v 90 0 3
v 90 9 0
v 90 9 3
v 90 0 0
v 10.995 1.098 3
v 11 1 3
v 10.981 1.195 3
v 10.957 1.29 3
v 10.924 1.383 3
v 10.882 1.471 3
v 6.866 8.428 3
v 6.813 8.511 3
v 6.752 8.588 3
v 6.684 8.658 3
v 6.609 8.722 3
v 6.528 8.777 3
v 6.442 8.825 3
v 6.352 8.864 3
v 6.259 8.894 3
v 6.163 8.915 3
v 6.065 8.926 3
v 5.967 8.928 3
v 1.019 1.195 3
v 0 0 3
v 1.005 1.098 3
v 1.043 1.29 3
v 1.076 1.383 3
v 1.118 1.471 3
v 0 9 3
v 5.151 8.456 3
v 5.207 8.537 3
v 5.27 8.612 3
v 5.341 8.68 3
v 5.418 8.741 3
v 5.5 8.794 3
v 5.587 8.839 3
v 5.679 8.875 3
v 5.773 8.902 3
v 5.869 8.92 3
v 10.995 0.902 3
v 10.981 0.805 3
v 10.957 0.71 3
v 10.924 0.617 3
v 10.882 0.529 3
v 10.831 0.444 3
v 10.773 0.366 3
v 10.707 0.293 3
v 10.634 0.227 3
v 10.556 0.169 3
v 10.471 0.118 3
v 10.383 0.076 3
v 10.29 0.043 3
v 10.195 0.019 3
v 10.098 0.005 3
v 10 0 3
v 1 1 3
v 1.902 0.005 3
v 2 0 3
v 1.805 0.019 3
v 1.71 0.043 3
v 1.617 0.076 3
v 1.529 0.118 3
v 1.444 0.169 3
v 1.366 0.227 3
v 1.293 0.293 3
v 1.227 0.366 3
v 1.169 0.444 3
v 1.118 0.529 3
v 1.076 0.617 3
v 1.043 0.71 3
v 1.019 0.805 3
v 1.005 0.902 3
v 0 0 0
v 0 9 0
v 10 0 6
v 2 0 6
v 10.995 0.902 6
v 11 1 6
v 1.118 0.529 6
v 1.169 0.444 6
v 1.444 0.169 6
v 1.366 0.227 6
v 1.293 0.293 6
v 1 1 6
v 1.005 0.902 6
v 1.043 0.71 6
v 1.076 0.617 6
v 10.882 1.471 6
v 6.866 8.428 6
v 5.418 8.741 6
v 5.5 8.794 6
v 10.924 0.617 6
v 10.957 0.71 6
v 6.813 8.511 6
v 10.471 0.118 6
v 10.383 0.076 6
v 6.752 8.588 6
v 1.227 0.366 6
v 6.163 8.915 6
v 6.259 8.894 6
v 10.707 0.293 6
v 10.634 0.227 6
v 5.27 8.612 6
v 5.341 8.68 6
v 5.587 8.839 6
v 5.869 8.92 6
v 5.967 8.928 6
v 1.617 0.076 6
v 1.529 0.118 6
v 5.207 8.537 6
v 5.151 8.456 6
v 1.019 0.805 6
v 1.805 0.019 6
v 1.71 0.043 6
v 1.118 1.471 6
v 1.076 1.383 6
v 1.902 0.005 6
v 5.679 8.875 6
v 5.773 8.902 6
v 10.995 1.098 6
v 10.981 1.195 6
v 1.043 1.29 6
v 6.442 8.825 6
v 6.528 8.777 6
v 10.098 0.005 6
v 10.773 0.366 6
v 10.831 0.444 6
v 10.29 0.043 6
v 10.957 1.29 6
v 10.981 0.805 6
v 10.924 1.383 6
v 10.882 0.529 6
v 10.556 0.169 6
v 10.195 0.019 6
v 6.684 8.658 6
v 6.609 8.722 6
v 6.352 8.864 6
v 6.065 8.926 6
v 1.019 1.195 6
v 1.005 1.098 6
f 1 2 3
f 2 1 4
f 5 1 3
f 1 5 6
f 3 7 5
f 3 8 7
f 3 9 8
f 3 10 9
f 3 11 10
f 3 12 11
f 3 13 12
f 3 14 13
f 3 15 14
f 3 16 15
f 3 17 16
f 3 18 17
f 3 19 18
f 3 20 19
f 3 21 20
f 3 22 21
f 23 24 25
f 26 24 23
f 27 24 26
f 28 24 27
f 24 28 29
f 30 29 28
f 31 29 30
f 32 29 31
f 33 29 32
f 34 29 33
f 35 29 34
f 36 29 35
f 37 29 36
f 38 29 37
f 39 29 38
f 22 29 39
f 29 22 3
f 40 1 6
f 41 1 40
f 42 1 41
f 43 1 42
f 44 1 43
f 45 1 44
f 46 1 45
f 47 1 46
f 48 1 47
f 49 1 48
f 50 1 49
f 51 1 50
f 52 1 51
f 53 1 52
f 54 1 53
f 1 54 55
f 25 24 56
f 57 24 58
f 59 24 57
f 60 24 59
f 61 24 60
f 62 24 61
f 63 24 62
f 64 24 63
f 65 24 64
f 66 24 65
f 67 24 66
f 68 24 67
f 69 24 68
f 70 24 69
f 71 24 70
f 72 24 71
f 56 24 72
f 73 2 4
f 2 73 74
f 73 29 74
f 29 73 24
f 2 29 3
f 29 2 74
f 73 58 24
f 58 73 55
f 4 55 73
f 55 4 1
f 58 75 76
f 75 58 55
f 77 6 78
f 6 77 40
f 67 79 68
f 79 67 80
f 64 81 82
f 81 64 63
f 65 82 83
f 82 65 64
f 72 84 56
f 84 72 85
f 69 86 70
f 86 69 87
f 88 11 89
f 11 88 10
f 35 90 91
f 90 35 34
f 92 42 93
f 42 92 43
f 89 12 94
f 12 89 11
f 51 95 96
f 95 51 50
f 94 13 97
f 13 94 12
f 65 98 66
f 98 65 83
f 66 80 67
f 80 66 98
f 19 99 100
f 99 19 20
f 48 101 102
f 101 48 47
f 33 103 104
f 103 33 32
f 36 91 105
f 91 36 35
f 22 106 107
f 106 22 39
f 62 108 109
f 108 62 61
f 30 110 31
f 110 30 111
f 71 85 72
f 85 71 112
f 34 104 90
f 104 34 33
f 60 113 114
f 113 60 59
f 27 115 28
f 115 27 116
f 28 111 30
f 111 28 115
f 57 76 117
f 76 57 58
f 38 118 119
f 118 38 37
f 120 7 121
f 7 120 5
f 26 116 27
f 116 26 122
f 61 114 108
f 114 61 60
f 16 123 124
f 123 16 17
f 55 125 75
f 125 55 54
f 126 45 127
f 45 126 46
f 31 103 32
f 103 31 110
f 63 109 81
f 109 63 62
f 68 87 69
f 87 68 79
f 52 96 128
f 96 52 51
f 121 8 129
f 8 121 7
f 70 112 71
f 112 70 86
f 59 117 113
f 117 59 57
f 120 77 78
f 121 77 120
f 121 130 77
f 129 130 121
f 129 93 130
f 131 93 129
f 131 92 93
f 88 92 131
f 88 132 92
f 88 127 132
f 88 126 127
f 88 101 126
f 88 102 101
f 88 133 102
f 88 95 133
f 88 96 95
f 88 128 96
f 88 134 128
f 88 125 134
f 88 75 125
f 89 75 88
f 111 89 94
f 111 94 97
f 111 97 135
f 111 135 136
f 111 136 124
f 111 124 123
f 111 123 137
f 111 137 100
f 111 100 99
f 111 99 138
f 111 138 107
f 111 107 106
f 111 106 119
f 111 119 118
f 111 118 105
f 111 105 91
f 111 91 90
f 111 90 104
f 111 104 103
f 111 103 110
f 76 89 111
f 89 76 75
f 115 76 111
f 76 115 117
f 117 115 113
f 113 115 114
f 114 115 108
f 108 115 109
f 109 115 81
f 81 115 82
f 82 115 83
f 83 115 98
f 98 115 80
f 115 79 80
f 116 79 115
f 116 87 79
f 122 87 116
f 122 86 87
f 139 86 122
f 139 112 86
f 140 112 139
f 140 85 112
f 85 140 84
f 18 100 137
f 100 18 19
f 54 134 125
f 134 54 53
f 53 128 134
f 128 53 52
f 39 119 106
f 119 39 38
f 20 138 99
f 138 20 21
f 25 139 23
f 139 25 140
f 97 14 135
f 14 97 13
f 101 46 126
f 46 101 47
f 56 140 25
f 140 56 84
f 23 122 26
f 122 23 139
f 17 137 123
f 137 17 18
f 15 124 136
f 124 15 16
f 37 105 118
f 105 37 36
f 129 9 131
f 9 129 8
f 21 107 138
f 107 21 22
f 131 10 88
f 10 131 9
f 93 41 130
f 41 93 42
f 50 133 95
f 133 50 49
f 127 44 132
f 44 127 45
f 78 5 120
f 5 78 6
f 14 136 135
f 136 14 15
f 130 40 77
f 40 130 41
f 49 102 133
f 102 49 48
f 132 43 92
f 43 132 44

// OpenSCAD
$fn=64;
r=1;
h=3;

module equ_triangle(side_length,corner_radius,triangle_height) {
    translate([0, corner_radius, 0]) {
        hull() {
            cylinder(r=corner_radius, h=triangle_height);
            rotate([0,0,180]) translate([side_length-corner_radius*2,0,0]) cylinder(r=corner_radius, h=triangle_height);
            rotate([0,0,120]) translate([side_length-corner_radius*2,0,0]) cylinder(r=corner_radius, h=triangle_height);
        }
    }
}

cube([90,9,3]);
translate([10,0,3])
//    mirror([0,1,0])
        equ_triangle(10, 1, 3);
/*
cylinder(r=r, h=h);
translate([8,0,0]) cylinder(r=r, h=h);
translate([4,7,0]) cylinder(r=r, h=h);
*/
